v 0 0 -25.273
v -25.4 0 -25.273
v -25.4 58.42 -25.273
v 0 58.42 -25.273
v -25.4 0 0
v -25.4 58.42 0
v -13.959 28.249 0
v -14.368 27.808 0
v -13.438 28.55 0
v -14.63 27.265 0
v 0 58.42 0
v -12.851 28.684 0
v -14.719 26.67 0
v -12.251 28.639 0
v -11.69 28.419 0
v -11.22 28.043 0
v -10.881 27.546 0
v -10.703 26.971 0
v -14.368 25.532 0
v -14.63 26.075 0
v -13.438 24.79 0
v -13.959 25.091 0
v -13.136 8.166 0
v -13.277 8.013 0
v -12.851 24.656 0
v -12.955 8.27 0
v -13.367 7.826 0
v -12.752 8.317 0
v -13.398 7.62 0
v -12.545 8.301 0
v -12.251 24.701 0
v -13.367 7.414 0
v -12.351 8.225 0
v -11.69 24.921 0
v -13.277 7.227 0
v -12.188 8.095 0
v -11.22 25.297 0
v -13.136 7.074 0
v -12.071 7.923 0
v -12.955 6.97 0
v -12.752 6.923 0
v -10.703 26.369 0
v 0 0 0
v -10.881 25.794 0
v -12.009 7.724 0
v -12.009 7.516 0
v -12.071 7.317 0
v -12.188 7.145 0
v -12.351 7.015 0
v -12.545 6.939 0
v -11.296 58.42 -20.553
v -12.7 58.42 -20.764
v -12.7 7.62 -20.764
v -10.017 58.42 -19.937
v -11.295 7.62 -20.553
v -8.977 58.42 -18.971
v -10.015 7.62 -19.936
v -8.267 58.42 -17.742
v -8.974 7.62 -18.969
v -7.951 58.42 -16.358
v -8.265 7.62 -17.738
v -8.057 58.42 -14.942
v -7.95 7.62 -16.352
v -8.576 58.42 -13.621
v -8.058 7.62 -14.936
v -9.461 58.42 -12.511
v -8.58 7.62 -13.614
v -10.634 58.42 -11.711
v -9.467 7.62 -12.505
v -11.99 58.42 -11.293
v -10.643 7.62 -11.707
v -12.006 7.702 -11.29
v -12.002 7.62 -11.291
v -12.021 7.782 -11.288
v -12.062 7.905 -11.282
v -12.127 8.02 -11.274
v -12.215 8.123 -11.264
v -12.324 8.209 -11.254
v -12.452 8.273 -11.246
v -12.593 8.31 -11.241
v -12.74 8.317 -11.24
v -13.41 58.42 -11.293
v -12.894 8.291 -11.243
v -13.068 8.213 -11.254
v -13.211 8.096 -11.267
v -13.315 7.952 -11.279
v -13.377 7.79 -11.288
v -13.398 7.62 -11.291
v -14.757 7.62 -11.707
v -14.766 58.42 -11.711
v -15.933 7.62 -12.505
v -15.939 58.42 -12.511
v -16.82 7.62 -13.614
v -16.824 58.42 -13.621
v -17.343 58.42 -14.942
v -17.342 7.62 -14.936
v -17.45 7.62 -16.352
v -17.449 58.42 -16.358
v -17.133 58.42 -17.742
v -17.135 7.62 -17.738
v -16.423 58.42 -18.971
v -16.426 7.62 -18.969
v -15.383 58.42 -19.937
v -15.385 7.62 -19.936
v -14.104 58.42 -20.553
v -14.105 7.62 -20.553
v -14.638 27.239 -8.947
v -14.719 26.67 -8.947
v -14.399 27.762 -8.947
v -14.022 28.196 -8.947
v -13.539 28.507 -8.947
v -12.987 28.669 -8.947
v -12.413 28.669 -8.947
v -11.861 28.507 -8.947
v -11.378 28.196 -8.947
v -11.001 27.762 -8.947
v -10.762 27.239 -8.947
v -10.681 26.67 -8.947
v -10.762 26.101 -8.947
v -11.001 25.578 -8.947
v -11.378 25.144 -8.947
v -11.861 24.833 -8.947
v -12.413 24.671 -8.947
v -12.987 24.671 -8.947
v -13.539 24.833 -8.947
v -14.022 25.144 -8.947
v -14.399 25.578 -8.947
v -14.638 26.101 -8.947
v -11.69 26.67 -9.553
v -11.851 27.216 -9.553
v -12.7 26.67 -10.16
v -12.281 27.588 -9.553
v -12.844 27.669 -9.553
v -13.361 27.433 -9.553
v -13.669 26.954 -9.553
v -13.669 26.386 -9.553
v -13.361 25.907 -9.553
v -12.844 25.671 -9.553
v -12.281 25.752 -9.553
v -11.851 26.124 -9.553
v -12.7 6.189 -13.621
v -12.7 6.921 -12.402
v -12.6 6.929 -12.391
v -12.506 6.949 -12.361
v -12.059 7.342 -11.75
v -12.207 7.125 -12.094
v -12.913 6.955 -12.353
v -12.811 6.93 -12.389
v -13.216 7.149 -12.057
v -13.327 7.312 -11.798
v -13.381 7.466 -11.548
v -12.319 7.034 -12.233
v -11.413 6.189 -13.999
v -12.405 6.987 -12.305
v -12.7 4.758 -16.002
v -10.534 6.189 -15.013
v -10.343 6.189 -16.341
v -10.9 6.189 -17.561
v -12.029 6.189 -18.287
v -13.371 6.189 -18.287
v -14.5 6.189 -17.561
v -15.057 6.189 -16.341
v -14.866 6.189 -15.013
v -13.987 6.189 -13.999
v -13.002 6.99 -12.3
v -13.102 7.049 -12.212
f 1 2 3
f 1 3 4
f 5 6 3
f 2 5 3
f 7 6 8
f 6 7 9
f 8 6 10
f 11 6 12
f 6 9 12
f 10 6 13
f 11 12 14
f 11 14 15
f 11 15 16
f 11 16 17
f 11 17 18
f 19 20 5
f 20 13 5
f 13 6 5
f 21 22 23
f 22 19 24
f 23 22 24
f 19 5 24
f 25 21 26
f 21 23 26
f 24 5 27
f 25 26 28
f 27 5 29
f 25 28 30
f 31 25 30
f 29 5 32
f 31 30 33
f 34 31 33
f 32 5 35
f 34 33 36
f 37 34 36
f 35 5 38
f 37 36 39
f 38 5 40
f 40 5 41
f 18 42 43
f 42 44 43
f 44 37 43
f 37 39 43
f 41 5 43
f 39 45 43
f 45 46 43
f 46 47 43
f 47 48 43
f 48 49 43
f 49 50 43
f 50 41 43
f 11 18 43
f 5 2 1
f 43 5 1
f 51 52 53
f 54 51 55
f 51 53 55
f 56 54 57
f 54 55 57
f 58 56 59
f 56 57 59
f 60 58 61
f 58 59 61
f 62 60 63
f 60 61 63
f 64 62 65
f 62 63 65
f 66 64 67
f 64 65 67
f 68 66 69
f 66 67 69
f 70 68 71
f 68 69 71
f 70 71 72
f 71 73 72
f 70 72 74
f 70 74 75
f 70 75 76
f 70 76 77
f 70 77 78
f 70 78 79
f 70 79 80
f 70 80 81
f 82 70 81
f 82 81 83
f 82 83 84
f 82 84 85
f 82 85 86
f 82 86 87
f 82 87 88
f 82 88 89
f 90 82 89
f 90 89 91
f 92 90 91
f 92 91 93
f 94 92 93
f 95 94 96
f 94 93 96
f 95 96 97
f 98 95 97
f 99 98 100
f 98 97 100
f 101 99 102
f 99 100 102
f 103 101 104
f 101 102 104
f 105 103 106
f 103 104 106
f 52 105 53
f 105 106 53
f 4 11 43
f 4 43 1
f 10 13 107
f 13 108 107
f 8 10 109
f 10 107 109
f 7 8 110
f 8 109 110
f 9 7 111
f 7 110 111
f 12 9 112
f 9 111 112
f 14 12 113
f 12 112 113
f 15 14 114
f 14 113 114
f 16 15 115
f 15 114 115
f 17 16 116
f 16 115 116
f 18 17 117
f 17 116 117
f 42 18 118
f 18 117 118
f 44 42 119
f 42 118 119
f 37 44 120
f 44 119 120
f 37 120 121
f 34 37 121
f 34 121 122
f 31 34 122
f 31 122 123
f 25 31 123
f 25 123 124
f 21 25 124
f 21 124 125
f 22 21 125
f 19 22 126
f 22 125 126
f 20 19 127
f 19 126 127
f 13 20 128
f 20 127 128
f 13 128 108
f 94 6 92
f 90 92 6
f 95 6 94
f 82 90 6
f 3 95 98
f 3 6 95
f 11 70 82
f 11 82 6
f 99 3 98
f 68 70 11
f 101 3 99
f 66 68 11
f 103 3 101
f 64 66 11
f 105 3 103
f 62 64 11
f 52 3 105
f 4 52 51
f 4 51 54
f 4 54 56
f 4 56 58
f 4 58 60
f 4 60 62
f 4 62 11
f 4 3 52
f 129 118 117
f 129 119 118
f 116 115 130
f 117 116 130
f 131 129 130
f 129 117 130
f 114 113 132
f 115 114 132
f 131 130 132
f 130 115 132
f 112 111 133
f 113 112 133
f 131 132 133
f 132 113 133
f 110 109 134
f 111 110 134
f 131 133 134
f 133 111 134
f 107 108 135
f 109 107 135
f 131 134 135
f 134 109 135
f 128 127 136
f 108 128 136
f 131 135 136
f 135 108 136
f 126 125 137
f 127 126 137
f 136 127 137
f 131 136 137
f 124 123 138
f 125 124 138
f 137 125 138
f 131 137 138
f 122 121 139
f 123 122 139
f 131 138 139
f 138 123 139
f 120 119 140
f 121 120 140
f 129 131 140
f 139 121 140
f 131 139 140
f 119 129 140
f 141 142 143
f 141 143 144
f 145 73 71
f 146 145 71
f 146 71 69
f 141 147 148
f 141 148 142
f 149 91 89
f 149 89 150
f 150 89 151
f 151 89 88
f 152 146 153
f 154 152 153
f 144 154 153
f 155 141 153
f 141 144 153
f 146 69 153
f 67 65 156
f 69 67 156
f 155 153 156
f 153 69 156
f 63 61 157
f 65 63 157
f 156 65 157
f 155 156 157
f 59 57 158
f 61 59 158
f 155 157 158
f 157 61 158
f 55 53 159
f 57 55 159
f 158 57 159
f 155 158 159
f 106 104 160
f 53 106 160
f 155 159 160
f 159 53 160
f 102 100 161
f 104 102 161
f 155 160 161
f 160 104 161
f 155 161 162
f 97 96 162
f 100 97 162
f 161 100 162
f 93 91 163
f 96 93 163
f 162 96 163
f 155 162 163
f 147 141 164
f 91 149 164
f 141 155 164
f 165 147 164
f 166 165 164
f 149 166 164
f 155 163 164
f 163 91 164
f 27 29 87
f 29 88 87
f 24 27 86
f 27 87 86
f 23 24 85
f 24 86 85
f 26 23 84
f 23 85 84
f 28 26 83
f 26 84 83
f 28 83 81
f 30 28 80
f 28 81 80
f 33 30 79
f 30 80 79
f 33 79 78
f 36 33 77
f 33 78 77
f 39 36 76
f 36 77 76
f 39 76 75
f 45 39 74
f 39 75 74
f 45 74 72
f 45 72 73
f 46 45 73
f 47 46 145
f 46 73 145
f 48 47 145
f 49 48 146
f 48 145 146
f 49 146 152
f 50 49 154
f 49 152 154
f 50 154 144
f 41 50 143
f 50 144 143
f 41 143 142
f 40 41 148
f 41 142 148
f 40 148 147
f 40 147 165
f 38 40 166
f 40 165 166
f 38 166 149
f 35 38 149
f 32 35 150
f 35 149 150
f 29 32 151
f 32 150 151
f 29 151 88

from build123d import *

# Parameters (mm, degrees)
SKETCH1_W                        = 25.4
SKETCH1_H                        = 25.273
BOSS_EXTRUDE1_DEPTH              = 58.42
F_54_0_055_DIAMETER_HOLE1_D      = 1.397
F_54_0_055_DIAMETER_HOLE1_DEPTH  = 12.7
F_54_0_055_DIAMETER_HOLE1_TIP    = 0.419701142
F_3_8_0_375_DIAMETER_HOLE2_D     = 9.525
F_3_8_0_375_DIAMETER_HOLE2_DEPTH = 50.8
F_3_8_0_375_DIAMETER_HOLE2_TIP   = 2.861598698
F_10_32_TAPPED_HOLE1_D           = 4.0386
F_10_32_TAPPED_HOLE1_DEPTH       = 8.946682152
F_10_32_TAPPED_HOLE1_TIP         = 1.213317848


with BuildPart() as part:
    # Sketch1 → Boss-Extrude1 (new body)
    with BuildSketch(Plane(origin=(0, 0, 0), x_dir=(1, 0, 0), z_dir=(0, 1, 0))):
        with Locations((-12.7, 12.6365)):
            Rectangle(SKETCH1_W, SKETCH1_H)
    extrude(amount=BOSS_EXTRUDE1_DEPTH)

    # #54 (0.055) Diameter Hole1
    with Locations(Plane(origin=(-12.7, 7.62, 0), x_dir=(1, 0, 0), z_dir=(0, 0, 1))):
        with Locations((0, 0)):
            Hole(F_54_0_055_DIAMETER_HOLE1_D / 2, depth=F_54_0_055_DIAMETER_HOLE1_DEPTH)
            with Locations((0, 0, -(F_54_0_055_DIAMETER_HOLE1_DEPTH + F_54_0_055_DIAMETER_HOLE1_TIP / 2))):  # 118° drill point
                Cone(0, F_54_0_055_DIAMETER_HOLE1_D / 2, F_54_0_055_DIAMETER_HOLE1_TIP, mode=Mode.SUBTRACT)

    # 3/8 (0.375) Diameter Hole2
    with Locations(Plane(origin=(-12.7, 58.42, -16.002), x_dir=(0, 0, 1), z_dir=(0, 1, 0))):
        with Locations((0, 0)):
            Hole(F_3_8_0_375_DIAMETER_HOLE2_D / 2, depth=F_3_8_0_375_DIAMETER_HOLE2_DEPTH)
            with Locations((0, 0, -(F_3_8_0_375_DIAMETER_HOLE2_DEPTH + F_3_8_0_375_DIAMETER_HOLE2_TIP / 2))):  # 118° drill point
                Cone(0, F_3_8_0_375_DIAMETER_HOLE2_D / 2, F_3_8_0_375_DIAMETER_HOLE2_TIP, mode=Mode.SUBTRACT)

    # #10-32 Tapped Hole1
    with Locations(Plane(origin=(-12.7, 26.67, 0), x_dir=(1, 0, 0), z_dir=(0, 0, 1))):
        with Locations((0, 0)):
            Hole(F_10_32_TAPPED_HOLE1_D / 2, depth=F_10_32_TAPPED_HOLE1_DEPTH)
            with Locations((0, 0, -(F_10_32_TAPPED_HOLE1_DEPTH + F_10_32_TAPPED_HOLE1_TIP / 2))):  # 118° drill point
                Cone(0, F_10_32_TAPPED_HOLE1_D / 2, F_10_32_TAPPED_HOLE1_TIP, mode=Mode.SUBTRACT)


solid = part.part
